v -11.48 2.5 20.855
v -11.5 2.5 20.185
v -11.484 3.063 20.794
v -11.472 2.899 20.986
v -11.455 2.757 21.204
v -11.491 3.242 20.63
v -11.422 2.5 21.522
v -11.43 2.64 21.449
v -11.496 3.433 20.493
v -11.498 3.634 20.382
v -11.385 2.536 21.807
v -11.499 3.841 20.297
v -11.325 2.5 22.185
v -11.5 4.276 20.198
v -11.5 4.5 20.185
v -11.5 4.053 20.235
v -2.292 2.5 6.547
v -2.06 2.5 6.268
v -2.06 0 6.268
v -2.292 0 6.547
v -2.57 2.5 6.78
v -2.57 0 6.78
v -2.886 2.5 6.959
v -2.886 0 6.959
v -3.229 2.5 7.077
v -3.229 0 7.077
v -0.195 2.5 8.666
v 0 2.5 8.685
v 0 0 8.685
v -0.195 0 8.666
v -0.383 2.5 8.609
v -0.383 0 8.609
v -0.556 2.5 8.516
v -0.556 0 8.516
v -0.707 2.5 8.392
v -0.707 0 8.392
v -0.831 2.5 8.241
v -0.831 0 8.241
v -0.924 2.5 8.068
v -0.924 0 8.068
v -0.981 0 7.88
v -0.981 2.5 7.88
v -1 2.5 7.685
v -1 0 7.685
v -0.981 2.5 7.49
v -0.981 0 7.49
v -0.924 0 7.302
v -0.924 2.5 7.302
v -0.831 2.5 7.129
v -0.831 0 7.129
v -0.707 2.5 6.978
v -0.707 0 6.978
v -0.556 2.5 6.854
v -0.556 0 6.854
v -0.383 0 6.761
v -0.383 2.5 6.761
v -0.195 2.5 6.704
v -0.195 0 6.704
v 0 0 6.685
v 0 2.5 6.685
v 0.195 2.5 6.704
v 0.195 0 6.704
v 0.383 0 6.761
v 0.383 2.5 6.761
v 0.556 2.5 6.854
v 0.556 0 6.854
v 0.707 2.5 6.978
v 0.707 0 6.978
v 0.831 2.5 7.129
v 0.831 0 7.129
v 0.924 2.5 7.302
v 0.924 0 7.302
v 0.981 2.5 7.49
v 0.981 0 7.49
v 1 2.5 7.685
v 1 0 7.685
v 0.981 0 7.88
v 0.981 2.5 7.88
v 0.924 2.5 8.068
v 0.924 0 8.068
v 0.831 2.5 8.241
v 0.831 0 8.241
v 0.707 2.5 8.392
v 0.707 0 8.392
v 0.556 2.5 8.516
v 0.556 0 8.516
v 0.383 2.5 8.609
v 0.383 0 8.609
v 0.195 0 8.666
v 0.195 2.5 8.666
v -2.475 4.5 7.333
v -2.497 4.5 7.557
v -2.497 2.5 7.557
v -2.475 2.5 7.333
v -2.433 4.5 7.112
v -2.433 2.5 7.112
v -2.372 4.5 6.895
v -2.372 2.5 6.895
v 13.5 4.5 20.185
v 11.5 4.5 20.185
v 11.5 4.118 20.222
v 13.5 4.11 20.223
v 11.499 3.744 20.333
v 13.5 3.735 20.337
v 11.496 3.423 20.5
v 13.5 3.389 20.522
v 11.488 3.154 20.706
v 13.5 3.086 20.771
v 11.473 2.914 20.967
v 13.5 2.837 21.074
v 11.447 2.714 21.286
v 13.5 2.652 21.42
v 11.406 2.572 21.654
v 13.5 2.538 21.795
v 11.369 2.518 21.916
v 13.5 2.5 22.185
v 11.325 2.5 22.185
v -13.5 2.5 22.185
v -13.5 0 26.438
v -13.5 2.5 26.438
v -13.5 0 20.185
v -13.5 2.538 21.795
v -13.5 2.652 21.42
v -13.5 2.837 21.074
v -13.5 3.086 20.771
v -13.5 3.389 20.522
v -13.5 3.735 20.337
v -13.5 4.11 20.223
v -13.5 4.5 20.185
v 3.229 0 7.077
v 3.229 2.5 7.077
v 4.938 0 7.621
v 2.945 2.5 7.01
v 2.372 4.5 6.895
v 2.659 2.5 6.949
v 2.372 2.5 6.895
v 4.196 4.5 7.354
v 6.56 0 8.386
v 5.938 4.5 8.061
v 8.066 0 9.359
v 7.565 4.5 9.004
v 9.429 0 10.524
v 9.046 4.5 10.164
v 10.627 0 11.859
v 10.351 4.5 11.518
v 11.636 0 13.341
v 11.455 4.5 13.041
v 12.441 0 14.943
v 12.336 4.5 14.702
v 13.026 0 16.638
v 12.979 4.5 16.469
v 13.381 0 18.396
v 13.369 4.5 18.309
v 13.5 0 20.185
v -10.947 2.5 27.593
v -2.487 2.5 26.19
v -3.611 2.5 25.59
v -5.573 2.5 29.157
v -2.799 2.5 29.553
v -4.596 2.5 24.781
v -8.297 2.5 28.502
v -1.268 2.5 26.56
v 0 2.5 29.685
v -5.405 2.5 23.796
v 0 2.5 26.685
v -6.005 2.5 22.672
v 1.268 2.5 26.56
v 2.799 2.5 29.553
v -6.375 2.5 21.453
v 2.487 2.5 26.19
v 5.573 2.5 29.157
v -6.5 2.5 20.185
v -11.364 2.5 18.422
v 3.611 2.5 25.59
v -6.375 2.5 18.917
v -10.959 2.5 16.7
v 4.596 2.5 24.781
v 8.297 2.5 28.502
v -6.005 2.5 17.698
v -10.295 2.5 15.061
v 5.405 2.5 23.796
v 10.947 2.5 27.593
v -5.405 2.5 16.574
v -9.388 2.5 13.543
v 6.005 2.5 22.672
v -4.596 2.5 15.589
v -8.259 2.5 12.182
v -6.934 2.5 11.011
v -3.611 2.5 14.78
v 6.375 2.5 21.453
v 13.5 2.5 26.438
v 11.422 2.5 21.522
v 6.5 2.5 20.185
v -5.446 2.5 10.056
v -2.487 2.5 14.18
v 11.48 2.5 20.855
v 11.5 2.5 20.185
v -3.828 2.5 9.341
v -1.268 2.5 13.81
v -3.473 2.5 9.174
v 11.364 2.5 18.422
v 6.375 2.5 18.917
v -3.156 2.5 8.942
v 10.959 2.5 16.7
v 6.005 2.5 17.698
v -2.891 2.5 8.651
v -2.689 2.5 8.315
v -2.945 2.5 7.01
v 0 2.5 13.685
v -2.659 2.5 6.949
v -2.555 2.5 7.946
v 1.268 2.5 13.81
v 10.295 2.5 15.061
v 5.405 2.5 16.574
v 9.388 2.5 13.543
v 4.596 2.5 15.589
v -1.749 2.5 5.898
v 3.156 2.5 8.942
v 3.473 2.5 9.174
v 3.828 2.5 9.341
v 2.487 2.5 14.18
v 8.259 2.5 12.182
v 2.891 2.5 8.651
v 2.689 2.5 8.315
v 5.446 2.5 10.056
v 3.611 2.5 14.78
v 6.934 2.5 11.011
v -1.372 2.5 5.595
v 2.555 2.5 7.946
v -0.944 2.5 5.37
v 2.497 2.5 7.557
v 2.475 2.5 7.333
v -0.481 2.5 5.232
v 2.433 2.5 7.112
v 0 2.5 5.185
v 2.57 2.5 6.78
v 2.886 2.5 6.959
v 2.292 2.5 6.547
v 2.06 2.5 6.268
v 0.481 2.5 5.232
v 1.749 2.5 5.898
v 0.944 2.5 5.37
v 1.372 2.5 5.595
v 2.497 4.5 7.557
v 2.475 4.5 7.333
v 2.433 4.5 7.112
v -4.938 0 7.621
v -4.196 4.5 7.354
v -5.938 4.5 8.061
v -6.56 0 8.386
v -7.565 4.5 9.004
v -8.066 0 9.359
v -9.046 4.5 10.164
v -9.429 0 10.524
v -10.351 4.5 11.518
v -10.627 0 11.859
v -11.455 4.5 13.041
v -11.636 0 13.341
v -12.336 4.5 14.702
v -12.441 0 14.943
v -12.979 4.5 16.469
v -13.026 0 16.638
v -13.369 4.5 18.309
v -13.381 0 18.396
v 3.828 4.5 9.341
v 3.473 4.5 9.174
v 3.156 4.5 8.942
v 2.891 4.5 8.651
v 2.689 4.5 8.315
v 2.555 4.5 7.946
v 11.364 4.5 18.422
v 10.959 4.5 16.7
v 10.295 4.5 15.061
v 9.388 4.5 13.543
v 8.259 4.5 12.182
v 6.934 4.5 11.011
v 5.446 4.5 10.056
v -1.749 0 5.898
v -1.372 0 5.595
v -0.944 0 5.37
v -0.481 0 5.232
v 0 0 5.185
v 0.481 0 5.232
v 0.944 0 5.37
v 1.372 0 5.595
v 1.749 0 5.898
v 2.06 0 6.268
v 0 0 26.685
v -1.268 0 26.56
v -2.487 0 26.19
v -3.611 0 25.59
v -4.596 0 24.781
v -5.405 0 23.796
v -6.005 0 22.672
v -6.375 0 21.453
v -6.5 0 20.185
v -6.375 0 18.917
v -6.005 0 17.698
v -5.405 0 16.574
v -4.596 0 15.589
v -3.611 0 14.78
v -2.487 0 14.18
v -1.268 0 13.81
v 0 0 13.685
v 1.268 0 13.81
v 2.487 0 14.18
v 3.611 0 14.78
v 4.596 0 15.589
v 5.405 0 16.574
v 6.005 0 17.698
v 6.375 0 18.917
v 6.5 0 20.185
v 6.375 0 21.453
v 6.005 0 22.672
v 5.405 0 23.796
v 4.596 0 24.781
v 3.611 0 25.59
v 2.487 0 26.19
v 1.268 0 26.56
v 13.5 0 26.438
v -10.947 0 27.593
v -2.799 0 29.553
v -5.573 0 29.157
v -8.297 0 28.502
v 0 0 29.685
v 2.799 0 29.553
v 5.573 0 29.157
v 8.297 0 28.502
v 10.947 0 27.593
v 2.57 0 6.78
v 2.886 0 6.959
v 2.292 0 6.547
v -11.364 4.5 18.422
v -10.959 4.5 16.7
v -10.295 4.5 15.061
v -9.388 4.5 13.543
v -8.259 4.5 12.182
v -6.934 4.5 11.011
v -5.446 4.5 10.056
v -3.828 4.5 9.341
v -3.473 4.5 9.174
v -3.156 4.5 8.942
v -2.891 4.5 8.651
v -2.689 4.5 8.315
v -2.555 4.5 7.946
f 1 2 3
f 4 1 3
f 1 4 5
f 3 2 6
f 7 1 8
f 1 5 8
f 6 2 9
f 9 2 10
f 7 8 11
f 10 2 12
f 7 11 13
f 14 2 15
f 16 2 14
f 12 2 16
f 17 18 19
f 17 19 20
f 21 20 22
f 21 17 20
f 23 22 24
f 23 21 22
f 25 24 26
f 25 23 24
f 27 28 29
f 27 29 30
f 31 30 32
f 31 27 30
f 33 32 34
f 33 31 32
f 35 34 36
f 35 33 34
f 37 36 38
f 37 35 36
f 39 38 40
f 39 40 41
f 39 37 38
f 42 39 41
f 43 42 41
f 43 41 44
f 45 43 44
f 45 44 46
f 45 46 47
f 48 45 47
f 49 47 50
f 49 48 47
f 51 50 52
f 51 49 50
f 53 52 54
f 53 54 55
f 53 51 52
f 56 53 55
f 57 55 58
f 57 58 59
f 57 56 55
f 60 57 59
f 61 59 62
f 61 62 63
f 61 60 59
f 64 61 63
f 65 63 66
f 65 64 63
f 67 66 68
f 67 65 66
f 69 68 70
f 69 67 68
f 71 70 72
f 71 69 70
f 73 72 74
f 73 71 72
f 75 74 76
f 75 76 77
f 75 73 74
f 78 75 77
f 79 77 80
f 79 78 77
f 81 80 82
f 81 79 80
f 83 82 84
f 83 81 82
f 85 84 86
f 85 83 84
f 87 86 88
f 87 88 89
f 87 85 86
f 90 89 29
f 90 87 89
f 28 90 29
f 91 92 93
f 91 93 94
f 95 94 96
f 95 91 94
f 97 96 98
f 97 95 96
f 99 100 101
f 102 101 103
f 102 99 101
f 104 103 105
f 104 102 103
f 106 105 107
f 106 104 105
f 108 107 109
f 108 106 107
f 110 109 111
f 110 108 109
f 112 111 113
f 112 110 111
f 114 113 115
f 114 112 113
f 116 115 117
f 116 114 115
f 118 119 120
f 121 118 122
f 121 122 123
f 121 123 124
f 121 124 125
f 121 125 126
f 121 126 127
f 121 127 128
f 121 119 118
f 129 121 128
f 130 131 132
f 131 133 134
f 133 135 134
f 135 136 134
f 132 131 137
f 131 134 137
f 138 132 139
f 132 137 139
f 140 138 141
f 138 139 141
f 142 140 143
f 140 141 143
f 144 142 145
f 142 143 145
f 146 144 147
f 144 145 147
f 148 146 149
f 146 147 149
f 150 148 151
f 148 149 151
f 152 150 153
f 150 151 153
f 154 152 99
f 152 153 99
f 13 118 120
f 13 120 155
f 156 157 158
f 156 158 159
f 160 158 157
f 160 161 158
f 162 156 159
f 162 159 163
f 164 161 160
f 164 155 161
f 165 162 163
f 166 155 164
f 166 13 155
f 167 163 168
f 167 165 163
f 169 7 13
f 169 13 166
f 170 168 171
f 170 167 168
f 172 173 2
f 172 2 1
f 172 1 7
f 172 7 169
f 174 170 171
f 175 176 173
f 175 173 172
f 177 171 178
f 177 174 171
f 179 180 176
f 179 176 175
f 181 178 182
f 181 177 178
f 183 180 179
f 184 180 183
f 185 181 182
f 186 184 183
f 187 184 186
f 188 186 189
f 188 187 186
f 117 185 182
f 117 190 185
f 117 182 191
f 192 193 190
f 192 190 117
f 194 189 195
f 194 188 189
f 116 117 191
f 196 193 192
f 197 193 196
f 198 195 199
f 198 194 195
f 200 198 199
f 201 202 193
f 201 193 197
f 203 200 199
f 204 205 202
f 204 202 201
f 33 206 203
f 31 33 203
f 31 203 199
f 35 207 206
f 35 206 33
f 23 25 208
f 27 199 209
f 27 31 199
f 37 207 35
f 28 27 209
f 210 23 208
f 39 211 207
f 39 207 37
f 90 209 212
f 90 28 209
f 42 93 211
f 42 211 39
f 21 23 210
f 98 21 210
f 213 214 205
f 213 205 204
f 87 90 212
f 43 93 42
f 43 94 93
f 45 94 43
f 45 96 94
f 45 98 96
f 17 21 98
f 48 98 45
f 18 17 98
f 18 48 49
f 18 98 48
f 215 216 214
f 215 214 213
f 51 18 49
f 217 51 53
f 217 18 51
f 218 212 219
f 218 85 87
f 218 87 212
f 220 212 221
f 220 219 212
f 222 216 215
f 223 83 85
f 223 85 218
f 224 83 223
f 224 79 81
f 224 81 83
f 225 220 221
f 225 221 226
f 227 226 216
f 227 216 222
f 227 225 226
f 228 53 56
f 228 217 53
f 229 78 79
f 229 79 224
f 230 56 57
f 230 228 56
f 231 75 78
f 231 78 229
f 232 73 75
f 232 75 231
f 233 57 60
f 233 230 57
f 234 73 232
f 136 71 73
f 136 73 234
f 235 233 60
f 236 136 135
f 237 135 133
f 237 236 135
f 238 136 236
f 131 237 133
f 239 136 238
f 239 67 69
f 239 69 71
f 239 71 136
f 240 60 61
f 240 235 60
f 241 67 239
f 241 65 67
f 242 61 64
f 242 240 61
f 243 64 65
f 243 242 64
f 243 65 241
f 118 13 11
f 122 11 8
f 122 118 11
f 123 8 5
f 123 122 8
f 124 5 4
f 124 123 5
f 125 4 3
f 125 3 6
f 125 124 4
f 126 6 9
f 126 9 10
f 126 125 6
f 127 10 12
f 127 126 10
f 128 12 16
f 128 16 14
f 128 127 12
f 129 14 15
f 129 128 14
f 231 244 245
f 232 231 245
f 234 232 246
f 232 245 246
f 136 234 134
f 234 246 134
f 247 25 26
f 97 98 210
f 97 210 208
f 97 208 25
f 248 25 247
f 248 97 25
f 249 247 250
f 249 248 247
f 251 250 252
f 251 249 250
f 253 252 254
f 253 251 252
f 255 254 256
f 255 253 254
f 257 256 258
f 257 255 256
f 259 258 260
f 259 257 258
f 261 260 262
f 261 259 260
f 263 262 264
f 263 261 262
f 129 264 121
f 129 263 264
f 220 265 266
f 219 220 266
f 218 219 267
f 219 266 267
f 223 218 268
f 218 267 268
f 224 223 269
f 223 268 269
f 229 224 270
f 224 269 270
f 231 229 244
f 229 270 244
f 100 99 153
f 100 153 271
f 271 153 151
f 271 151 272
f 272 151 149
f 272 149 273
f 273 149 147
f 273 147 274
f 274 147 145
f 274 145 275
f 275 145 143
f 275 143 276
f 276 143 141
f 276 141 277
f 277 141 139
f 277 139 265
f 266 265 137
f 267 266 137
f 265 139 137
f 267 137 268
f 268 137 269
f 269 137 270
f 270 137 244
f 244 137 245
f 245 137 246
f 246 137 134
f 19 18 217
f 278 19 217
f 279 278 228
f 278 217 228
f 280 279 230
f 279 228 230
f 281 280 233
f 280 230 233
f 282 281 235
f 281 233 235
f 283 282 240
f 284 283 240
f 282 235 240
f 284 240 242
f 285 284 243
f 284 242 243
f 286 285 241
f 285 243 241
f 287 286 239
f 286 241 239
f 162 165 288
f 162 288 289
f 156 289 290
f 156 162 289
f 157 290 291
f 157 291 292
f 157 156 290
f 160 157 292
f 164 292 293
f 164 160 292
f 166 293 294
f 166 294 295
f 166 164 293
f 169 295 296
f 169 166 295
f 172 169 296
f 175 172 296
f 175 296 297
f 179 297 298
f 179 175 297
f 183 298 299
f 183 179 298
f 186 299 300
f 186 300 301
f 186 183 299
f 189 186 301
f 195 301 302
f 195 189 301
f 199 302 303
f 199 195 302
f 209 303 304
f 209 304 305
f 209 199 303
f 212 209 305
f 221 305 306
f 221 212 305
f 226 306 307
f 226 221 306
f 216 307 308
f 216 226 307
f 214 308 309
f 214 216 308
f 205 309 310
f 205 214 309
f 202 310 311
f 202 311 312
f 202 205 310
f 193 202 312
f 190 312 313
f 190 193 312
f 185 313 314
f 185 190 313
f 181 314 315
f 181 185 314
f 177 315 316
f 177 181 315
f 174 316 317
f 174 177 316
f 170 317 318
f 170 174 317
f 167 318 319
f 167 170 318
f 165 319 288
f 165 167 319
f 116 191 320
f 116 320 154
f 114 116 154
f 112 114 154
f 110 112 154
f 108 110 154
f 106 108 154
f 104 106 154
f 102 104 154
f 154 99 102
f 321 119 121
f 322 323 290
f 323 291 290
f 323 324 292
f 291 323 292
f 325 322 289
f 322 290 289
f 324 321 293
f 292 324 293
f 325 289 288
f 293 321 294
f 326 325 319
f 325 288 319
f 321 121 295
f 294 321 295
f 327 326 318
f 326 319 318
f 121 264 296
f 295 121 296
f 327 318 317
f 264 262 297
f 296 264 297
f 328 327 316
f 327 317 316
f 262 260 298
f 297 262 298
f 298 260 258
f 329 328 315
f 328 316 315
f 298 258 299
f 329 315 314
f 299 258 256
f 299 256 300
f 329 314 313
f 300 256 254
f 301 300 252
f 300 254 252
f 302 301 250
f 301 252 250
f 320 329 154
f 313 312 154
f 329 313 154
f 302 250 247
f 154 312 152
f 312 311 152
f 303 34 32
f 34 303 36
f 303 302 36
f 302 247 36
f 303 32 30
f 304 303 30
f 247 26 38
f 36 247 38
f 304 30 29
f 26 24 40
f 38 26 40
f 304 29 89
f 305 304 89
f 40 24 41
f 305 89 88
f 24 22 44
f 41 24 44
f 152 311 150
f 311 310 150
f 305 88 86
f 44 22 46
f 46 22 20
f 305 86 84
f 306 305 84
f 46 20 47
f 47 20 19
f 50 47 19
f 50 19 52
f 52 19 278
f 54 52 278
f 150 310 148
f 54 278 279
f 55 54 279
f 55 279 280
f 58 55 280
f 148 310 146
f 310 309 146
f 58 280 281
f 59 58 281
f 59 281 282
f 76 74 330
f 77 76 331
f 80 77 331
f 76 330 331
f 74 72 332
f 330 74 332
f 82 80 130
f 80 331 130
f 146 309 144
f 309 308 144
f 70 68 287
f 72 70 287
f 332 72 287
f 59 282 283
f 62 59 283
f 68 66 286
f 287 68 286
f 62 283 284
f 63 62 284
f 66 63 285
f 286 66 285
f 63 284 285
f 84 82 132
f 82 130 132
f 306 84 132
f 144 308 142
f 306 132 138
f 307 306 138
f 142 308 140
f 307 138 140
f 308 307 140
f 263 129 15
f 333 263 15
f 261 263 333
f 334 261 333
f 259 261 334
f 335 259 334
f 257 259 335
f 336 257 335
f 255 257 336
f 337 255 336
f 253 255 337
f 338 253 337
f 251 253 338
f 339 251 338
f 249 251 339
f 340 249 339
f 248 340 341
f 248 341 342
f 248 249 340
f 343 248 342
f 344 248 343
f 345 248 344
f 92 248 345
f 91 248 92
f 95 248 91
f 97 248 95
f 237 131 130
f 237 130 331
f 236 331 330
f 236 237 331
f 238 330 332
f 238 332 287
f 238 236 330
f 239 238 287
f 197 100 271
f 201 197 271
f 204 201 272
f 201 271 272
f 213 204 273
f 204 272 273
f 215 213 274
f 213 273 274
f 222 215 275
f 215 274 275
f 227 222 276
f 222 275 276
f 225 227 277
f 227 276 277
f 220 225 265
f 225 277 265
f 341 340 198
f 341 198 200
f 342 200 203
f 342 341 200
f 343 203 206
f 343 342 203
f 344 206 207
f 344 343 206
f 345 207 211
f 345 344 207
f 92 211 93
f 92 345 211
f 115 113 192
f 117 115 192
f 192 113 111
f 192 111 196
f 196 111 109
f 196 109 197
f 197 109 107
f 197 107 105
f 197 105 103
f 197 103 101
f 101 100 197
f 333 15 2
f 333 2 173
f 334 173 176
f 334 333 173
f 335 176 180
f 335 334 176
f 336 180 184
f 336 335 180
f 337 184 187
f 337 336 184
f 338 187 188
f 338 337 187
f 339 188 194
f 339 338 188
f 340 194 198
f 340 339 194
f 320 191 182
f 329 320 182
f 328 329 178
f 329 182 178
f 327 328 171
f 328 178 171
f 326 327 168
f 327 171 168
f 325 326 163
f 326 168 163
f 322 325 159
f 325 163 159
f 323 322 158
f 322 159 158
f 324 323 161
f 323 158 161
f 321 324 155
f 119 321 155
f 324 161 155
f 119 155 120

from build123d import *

# Parameters (mm, degrees)
SKETCH1_R                  = 6.5
SKETCH1_R_2                = 1
MAIN_EXTRUDE_DEPTH         = 2.5
BATTERY_START              = 2
BATTERY_RING_CRADDLE_DEPTH = 2
FILLETS_R                  = 2


with BuildPart() as part:
    # Sketch1 → Main extrude (new body)
    with BuildSketch(Plane.XZ.offset(-2.5)):
        with BuildLine():
            Line((-13.5, 26.437647872), (-13.5, 20.185))
            ThreePointArc((-13.5, 20.185), (-10.350618886, 11.518126938), (-2.371897974, 6.895))
            ThreePointArc((-2.371897974, 6.895), (0, 5.185), (2.371897974, 6.895))
            ThreePointArc((2.371897974, 6.895), (10.350618886, 11.518126938), (13.5, 20.185))
            Line((13.5, 20.185), (13.5, 26.437647872))
            ThreePointArc((13.5, 26.437647872), (0, 29.685), (-13.5, 26.437647872))
        make_face()
        with Locations(Location((0, 20.185, 0), (0, 0, 90))):
            Circle(SKETCH1_R, mode=Mode.SUBTRACT)
        with Locations(Location((0, 7.685, 0), (0, 0, 90))):
            Circle(SKETCH1_R_2, mode=Mode.SUBTRACT)
    extrude(amount=MAIN_EXTRUDE_DEPTH)

    # Sketch2 → Battery ring craddle (add)
    with BuildSketch(Plane(origin=(0, 2.5, 0), x_dir=(1, 0, 0), z_dir=(0, 1, 0)).offset(BATTERY_START)):
        with BuildLine():
            Line((-13.5, -20.185), (-11.5, -20.185))
            ThreePointArc((-11.5, -20.185), (-9.38817648, -13.543302748), (-3.828323063, -9.340925926))
            ThreePointArc((-3.828323063, -9.340925926), (-2.89145393, -8.651439161), (-2.496732433, -7.557222222))
            ThreePointArc((-2.496732433, -7.557222222), (-2.456730567, -7.221885627), (-2.371897974, -6.895))
            ThreePointArc((-2.371897974, -6.895), (-10.350618886, -11.518126938), (-13.5, -20.185))
        make_face()
        with BuildLine():
            Line((13.5, -20.185), (11.5, -20.185))
            ThreePointArc((11.5, -20.185), (9.38817648, -13.543302748), (3.828323063, -9.340925926))
            ThreePointArc((3.828323063, -9.340925926), (2.89145393, -8.651439161), (2.496732433, -7.557222222))
            ThreePointArc((2.496732433, -7.557222222), (2.456730567, -7.221885627), (2.371897974, -6.895))
            ThreePointArc((2.371897974, -6.895), (10.350618886, -11.518126938), (13.5, -20.185))
        make_face()
    extrude(amount=-BATTERY_RING_CRADDLE_DEPTH)

    # Fillets
    # the kernel refuses this fillet: 2 mm, written as the material it adds along each edge
    with BuildSketch(Plane(origin=(2.371897974, 2.5, 6.895), x_dir=(-0.4457237071000903, 0, -0.8951705853796543), z_dir=(0, -1, 0))) as fillets_piece_1:
        with BuildLine():
            CenterArc((0.980073907, 1.980300021), FILLETS_R, 220.3095964, 41.641946396)
            ThreePointArc((-0.545046071, 0.686465004), (-0.266950187, 0.347657285), (0, 0))
            ThreePointArc((0, 0), (0.350026395, 0.024624973), (0.700052791, 0))
        make_face()
    extrude(amount=2.5)
    with BuildSketch(Plane(origin=(-2.371897974, 2.5, 6.895), x_dir=(-0.9782217139639082, 0, 0.20756270939047247), z_dir=(0, -1, 0))) as fillets_piece_2:
        with BuildLine():
            CenterArc((0.941460954, 1.9989458), FILLETS_R, 226.497666749, 41.641946396)
            ThreePointArc((-0.435307275, 0.548253123), (-0.198368351, 0.289438878), (0, 0))
            ThreePointArc((0, 0), (0.438266306, 0.007115851), (0.876532612, 0))
        make_face()
    extrude(amount=2.5)
    with BuildSketch(Plane(origin=(-13.5, 2.5, 20.185), x_dir=(0, 0, 1), z_dir=(1, 0, 0))) as fillets_piece_3_section:
        with BuildLine():
            CenterArc((FILLETS_R, -FILLETS_R), FILLETS_R, 90, 90)
            Line((0, -FILLETS_R), (0, 0))
            Line((0, 0), (FILLETS_R, 0))
        make_face()
    fillets_piece_3 = extrude(amount=7, mode=Mode.PRIVATE)
    fillets_piece_3 = fillets_piece_3 - Plane(origin=(0, 2.67362595, 20.185), x_dir=(-1, 0, 0), z_dir=(0, 1, 0)) * Cylinder(11.5, 22, mode=Mode.PRIVATE)
    add(fillets_piece_3)
    with BuildSketch(Plane(origin=(13.5, 2.5, 20.185), x_dir=(0, 0, 1), z_dir=(-1, 0, 0))) as fillets_piece_4_section:
        with BuildLine():
            CenterArc((FILLETS_R, FILLETS_R), FILLETS_R, 180, 90)
            Line((0, FILLETS_R), (0, 0))
            Line((0, 0), (FILLETS_R, 0))
        make_face()
    fillets_piece_4 = extrude(amount=7, mode=Mode.PRIVATE)
    fillets_piece_4 = fillets_piece_4 - Plane(origin=(0, 2.673614475, 20.185), x_dir=(1, 0, 0), z_dir=(0, 1, 0)) * Cylinder(11.5, 22, mode=Mode.PRIVATE)
    add(fillets_piece_4)


solid = part.part
